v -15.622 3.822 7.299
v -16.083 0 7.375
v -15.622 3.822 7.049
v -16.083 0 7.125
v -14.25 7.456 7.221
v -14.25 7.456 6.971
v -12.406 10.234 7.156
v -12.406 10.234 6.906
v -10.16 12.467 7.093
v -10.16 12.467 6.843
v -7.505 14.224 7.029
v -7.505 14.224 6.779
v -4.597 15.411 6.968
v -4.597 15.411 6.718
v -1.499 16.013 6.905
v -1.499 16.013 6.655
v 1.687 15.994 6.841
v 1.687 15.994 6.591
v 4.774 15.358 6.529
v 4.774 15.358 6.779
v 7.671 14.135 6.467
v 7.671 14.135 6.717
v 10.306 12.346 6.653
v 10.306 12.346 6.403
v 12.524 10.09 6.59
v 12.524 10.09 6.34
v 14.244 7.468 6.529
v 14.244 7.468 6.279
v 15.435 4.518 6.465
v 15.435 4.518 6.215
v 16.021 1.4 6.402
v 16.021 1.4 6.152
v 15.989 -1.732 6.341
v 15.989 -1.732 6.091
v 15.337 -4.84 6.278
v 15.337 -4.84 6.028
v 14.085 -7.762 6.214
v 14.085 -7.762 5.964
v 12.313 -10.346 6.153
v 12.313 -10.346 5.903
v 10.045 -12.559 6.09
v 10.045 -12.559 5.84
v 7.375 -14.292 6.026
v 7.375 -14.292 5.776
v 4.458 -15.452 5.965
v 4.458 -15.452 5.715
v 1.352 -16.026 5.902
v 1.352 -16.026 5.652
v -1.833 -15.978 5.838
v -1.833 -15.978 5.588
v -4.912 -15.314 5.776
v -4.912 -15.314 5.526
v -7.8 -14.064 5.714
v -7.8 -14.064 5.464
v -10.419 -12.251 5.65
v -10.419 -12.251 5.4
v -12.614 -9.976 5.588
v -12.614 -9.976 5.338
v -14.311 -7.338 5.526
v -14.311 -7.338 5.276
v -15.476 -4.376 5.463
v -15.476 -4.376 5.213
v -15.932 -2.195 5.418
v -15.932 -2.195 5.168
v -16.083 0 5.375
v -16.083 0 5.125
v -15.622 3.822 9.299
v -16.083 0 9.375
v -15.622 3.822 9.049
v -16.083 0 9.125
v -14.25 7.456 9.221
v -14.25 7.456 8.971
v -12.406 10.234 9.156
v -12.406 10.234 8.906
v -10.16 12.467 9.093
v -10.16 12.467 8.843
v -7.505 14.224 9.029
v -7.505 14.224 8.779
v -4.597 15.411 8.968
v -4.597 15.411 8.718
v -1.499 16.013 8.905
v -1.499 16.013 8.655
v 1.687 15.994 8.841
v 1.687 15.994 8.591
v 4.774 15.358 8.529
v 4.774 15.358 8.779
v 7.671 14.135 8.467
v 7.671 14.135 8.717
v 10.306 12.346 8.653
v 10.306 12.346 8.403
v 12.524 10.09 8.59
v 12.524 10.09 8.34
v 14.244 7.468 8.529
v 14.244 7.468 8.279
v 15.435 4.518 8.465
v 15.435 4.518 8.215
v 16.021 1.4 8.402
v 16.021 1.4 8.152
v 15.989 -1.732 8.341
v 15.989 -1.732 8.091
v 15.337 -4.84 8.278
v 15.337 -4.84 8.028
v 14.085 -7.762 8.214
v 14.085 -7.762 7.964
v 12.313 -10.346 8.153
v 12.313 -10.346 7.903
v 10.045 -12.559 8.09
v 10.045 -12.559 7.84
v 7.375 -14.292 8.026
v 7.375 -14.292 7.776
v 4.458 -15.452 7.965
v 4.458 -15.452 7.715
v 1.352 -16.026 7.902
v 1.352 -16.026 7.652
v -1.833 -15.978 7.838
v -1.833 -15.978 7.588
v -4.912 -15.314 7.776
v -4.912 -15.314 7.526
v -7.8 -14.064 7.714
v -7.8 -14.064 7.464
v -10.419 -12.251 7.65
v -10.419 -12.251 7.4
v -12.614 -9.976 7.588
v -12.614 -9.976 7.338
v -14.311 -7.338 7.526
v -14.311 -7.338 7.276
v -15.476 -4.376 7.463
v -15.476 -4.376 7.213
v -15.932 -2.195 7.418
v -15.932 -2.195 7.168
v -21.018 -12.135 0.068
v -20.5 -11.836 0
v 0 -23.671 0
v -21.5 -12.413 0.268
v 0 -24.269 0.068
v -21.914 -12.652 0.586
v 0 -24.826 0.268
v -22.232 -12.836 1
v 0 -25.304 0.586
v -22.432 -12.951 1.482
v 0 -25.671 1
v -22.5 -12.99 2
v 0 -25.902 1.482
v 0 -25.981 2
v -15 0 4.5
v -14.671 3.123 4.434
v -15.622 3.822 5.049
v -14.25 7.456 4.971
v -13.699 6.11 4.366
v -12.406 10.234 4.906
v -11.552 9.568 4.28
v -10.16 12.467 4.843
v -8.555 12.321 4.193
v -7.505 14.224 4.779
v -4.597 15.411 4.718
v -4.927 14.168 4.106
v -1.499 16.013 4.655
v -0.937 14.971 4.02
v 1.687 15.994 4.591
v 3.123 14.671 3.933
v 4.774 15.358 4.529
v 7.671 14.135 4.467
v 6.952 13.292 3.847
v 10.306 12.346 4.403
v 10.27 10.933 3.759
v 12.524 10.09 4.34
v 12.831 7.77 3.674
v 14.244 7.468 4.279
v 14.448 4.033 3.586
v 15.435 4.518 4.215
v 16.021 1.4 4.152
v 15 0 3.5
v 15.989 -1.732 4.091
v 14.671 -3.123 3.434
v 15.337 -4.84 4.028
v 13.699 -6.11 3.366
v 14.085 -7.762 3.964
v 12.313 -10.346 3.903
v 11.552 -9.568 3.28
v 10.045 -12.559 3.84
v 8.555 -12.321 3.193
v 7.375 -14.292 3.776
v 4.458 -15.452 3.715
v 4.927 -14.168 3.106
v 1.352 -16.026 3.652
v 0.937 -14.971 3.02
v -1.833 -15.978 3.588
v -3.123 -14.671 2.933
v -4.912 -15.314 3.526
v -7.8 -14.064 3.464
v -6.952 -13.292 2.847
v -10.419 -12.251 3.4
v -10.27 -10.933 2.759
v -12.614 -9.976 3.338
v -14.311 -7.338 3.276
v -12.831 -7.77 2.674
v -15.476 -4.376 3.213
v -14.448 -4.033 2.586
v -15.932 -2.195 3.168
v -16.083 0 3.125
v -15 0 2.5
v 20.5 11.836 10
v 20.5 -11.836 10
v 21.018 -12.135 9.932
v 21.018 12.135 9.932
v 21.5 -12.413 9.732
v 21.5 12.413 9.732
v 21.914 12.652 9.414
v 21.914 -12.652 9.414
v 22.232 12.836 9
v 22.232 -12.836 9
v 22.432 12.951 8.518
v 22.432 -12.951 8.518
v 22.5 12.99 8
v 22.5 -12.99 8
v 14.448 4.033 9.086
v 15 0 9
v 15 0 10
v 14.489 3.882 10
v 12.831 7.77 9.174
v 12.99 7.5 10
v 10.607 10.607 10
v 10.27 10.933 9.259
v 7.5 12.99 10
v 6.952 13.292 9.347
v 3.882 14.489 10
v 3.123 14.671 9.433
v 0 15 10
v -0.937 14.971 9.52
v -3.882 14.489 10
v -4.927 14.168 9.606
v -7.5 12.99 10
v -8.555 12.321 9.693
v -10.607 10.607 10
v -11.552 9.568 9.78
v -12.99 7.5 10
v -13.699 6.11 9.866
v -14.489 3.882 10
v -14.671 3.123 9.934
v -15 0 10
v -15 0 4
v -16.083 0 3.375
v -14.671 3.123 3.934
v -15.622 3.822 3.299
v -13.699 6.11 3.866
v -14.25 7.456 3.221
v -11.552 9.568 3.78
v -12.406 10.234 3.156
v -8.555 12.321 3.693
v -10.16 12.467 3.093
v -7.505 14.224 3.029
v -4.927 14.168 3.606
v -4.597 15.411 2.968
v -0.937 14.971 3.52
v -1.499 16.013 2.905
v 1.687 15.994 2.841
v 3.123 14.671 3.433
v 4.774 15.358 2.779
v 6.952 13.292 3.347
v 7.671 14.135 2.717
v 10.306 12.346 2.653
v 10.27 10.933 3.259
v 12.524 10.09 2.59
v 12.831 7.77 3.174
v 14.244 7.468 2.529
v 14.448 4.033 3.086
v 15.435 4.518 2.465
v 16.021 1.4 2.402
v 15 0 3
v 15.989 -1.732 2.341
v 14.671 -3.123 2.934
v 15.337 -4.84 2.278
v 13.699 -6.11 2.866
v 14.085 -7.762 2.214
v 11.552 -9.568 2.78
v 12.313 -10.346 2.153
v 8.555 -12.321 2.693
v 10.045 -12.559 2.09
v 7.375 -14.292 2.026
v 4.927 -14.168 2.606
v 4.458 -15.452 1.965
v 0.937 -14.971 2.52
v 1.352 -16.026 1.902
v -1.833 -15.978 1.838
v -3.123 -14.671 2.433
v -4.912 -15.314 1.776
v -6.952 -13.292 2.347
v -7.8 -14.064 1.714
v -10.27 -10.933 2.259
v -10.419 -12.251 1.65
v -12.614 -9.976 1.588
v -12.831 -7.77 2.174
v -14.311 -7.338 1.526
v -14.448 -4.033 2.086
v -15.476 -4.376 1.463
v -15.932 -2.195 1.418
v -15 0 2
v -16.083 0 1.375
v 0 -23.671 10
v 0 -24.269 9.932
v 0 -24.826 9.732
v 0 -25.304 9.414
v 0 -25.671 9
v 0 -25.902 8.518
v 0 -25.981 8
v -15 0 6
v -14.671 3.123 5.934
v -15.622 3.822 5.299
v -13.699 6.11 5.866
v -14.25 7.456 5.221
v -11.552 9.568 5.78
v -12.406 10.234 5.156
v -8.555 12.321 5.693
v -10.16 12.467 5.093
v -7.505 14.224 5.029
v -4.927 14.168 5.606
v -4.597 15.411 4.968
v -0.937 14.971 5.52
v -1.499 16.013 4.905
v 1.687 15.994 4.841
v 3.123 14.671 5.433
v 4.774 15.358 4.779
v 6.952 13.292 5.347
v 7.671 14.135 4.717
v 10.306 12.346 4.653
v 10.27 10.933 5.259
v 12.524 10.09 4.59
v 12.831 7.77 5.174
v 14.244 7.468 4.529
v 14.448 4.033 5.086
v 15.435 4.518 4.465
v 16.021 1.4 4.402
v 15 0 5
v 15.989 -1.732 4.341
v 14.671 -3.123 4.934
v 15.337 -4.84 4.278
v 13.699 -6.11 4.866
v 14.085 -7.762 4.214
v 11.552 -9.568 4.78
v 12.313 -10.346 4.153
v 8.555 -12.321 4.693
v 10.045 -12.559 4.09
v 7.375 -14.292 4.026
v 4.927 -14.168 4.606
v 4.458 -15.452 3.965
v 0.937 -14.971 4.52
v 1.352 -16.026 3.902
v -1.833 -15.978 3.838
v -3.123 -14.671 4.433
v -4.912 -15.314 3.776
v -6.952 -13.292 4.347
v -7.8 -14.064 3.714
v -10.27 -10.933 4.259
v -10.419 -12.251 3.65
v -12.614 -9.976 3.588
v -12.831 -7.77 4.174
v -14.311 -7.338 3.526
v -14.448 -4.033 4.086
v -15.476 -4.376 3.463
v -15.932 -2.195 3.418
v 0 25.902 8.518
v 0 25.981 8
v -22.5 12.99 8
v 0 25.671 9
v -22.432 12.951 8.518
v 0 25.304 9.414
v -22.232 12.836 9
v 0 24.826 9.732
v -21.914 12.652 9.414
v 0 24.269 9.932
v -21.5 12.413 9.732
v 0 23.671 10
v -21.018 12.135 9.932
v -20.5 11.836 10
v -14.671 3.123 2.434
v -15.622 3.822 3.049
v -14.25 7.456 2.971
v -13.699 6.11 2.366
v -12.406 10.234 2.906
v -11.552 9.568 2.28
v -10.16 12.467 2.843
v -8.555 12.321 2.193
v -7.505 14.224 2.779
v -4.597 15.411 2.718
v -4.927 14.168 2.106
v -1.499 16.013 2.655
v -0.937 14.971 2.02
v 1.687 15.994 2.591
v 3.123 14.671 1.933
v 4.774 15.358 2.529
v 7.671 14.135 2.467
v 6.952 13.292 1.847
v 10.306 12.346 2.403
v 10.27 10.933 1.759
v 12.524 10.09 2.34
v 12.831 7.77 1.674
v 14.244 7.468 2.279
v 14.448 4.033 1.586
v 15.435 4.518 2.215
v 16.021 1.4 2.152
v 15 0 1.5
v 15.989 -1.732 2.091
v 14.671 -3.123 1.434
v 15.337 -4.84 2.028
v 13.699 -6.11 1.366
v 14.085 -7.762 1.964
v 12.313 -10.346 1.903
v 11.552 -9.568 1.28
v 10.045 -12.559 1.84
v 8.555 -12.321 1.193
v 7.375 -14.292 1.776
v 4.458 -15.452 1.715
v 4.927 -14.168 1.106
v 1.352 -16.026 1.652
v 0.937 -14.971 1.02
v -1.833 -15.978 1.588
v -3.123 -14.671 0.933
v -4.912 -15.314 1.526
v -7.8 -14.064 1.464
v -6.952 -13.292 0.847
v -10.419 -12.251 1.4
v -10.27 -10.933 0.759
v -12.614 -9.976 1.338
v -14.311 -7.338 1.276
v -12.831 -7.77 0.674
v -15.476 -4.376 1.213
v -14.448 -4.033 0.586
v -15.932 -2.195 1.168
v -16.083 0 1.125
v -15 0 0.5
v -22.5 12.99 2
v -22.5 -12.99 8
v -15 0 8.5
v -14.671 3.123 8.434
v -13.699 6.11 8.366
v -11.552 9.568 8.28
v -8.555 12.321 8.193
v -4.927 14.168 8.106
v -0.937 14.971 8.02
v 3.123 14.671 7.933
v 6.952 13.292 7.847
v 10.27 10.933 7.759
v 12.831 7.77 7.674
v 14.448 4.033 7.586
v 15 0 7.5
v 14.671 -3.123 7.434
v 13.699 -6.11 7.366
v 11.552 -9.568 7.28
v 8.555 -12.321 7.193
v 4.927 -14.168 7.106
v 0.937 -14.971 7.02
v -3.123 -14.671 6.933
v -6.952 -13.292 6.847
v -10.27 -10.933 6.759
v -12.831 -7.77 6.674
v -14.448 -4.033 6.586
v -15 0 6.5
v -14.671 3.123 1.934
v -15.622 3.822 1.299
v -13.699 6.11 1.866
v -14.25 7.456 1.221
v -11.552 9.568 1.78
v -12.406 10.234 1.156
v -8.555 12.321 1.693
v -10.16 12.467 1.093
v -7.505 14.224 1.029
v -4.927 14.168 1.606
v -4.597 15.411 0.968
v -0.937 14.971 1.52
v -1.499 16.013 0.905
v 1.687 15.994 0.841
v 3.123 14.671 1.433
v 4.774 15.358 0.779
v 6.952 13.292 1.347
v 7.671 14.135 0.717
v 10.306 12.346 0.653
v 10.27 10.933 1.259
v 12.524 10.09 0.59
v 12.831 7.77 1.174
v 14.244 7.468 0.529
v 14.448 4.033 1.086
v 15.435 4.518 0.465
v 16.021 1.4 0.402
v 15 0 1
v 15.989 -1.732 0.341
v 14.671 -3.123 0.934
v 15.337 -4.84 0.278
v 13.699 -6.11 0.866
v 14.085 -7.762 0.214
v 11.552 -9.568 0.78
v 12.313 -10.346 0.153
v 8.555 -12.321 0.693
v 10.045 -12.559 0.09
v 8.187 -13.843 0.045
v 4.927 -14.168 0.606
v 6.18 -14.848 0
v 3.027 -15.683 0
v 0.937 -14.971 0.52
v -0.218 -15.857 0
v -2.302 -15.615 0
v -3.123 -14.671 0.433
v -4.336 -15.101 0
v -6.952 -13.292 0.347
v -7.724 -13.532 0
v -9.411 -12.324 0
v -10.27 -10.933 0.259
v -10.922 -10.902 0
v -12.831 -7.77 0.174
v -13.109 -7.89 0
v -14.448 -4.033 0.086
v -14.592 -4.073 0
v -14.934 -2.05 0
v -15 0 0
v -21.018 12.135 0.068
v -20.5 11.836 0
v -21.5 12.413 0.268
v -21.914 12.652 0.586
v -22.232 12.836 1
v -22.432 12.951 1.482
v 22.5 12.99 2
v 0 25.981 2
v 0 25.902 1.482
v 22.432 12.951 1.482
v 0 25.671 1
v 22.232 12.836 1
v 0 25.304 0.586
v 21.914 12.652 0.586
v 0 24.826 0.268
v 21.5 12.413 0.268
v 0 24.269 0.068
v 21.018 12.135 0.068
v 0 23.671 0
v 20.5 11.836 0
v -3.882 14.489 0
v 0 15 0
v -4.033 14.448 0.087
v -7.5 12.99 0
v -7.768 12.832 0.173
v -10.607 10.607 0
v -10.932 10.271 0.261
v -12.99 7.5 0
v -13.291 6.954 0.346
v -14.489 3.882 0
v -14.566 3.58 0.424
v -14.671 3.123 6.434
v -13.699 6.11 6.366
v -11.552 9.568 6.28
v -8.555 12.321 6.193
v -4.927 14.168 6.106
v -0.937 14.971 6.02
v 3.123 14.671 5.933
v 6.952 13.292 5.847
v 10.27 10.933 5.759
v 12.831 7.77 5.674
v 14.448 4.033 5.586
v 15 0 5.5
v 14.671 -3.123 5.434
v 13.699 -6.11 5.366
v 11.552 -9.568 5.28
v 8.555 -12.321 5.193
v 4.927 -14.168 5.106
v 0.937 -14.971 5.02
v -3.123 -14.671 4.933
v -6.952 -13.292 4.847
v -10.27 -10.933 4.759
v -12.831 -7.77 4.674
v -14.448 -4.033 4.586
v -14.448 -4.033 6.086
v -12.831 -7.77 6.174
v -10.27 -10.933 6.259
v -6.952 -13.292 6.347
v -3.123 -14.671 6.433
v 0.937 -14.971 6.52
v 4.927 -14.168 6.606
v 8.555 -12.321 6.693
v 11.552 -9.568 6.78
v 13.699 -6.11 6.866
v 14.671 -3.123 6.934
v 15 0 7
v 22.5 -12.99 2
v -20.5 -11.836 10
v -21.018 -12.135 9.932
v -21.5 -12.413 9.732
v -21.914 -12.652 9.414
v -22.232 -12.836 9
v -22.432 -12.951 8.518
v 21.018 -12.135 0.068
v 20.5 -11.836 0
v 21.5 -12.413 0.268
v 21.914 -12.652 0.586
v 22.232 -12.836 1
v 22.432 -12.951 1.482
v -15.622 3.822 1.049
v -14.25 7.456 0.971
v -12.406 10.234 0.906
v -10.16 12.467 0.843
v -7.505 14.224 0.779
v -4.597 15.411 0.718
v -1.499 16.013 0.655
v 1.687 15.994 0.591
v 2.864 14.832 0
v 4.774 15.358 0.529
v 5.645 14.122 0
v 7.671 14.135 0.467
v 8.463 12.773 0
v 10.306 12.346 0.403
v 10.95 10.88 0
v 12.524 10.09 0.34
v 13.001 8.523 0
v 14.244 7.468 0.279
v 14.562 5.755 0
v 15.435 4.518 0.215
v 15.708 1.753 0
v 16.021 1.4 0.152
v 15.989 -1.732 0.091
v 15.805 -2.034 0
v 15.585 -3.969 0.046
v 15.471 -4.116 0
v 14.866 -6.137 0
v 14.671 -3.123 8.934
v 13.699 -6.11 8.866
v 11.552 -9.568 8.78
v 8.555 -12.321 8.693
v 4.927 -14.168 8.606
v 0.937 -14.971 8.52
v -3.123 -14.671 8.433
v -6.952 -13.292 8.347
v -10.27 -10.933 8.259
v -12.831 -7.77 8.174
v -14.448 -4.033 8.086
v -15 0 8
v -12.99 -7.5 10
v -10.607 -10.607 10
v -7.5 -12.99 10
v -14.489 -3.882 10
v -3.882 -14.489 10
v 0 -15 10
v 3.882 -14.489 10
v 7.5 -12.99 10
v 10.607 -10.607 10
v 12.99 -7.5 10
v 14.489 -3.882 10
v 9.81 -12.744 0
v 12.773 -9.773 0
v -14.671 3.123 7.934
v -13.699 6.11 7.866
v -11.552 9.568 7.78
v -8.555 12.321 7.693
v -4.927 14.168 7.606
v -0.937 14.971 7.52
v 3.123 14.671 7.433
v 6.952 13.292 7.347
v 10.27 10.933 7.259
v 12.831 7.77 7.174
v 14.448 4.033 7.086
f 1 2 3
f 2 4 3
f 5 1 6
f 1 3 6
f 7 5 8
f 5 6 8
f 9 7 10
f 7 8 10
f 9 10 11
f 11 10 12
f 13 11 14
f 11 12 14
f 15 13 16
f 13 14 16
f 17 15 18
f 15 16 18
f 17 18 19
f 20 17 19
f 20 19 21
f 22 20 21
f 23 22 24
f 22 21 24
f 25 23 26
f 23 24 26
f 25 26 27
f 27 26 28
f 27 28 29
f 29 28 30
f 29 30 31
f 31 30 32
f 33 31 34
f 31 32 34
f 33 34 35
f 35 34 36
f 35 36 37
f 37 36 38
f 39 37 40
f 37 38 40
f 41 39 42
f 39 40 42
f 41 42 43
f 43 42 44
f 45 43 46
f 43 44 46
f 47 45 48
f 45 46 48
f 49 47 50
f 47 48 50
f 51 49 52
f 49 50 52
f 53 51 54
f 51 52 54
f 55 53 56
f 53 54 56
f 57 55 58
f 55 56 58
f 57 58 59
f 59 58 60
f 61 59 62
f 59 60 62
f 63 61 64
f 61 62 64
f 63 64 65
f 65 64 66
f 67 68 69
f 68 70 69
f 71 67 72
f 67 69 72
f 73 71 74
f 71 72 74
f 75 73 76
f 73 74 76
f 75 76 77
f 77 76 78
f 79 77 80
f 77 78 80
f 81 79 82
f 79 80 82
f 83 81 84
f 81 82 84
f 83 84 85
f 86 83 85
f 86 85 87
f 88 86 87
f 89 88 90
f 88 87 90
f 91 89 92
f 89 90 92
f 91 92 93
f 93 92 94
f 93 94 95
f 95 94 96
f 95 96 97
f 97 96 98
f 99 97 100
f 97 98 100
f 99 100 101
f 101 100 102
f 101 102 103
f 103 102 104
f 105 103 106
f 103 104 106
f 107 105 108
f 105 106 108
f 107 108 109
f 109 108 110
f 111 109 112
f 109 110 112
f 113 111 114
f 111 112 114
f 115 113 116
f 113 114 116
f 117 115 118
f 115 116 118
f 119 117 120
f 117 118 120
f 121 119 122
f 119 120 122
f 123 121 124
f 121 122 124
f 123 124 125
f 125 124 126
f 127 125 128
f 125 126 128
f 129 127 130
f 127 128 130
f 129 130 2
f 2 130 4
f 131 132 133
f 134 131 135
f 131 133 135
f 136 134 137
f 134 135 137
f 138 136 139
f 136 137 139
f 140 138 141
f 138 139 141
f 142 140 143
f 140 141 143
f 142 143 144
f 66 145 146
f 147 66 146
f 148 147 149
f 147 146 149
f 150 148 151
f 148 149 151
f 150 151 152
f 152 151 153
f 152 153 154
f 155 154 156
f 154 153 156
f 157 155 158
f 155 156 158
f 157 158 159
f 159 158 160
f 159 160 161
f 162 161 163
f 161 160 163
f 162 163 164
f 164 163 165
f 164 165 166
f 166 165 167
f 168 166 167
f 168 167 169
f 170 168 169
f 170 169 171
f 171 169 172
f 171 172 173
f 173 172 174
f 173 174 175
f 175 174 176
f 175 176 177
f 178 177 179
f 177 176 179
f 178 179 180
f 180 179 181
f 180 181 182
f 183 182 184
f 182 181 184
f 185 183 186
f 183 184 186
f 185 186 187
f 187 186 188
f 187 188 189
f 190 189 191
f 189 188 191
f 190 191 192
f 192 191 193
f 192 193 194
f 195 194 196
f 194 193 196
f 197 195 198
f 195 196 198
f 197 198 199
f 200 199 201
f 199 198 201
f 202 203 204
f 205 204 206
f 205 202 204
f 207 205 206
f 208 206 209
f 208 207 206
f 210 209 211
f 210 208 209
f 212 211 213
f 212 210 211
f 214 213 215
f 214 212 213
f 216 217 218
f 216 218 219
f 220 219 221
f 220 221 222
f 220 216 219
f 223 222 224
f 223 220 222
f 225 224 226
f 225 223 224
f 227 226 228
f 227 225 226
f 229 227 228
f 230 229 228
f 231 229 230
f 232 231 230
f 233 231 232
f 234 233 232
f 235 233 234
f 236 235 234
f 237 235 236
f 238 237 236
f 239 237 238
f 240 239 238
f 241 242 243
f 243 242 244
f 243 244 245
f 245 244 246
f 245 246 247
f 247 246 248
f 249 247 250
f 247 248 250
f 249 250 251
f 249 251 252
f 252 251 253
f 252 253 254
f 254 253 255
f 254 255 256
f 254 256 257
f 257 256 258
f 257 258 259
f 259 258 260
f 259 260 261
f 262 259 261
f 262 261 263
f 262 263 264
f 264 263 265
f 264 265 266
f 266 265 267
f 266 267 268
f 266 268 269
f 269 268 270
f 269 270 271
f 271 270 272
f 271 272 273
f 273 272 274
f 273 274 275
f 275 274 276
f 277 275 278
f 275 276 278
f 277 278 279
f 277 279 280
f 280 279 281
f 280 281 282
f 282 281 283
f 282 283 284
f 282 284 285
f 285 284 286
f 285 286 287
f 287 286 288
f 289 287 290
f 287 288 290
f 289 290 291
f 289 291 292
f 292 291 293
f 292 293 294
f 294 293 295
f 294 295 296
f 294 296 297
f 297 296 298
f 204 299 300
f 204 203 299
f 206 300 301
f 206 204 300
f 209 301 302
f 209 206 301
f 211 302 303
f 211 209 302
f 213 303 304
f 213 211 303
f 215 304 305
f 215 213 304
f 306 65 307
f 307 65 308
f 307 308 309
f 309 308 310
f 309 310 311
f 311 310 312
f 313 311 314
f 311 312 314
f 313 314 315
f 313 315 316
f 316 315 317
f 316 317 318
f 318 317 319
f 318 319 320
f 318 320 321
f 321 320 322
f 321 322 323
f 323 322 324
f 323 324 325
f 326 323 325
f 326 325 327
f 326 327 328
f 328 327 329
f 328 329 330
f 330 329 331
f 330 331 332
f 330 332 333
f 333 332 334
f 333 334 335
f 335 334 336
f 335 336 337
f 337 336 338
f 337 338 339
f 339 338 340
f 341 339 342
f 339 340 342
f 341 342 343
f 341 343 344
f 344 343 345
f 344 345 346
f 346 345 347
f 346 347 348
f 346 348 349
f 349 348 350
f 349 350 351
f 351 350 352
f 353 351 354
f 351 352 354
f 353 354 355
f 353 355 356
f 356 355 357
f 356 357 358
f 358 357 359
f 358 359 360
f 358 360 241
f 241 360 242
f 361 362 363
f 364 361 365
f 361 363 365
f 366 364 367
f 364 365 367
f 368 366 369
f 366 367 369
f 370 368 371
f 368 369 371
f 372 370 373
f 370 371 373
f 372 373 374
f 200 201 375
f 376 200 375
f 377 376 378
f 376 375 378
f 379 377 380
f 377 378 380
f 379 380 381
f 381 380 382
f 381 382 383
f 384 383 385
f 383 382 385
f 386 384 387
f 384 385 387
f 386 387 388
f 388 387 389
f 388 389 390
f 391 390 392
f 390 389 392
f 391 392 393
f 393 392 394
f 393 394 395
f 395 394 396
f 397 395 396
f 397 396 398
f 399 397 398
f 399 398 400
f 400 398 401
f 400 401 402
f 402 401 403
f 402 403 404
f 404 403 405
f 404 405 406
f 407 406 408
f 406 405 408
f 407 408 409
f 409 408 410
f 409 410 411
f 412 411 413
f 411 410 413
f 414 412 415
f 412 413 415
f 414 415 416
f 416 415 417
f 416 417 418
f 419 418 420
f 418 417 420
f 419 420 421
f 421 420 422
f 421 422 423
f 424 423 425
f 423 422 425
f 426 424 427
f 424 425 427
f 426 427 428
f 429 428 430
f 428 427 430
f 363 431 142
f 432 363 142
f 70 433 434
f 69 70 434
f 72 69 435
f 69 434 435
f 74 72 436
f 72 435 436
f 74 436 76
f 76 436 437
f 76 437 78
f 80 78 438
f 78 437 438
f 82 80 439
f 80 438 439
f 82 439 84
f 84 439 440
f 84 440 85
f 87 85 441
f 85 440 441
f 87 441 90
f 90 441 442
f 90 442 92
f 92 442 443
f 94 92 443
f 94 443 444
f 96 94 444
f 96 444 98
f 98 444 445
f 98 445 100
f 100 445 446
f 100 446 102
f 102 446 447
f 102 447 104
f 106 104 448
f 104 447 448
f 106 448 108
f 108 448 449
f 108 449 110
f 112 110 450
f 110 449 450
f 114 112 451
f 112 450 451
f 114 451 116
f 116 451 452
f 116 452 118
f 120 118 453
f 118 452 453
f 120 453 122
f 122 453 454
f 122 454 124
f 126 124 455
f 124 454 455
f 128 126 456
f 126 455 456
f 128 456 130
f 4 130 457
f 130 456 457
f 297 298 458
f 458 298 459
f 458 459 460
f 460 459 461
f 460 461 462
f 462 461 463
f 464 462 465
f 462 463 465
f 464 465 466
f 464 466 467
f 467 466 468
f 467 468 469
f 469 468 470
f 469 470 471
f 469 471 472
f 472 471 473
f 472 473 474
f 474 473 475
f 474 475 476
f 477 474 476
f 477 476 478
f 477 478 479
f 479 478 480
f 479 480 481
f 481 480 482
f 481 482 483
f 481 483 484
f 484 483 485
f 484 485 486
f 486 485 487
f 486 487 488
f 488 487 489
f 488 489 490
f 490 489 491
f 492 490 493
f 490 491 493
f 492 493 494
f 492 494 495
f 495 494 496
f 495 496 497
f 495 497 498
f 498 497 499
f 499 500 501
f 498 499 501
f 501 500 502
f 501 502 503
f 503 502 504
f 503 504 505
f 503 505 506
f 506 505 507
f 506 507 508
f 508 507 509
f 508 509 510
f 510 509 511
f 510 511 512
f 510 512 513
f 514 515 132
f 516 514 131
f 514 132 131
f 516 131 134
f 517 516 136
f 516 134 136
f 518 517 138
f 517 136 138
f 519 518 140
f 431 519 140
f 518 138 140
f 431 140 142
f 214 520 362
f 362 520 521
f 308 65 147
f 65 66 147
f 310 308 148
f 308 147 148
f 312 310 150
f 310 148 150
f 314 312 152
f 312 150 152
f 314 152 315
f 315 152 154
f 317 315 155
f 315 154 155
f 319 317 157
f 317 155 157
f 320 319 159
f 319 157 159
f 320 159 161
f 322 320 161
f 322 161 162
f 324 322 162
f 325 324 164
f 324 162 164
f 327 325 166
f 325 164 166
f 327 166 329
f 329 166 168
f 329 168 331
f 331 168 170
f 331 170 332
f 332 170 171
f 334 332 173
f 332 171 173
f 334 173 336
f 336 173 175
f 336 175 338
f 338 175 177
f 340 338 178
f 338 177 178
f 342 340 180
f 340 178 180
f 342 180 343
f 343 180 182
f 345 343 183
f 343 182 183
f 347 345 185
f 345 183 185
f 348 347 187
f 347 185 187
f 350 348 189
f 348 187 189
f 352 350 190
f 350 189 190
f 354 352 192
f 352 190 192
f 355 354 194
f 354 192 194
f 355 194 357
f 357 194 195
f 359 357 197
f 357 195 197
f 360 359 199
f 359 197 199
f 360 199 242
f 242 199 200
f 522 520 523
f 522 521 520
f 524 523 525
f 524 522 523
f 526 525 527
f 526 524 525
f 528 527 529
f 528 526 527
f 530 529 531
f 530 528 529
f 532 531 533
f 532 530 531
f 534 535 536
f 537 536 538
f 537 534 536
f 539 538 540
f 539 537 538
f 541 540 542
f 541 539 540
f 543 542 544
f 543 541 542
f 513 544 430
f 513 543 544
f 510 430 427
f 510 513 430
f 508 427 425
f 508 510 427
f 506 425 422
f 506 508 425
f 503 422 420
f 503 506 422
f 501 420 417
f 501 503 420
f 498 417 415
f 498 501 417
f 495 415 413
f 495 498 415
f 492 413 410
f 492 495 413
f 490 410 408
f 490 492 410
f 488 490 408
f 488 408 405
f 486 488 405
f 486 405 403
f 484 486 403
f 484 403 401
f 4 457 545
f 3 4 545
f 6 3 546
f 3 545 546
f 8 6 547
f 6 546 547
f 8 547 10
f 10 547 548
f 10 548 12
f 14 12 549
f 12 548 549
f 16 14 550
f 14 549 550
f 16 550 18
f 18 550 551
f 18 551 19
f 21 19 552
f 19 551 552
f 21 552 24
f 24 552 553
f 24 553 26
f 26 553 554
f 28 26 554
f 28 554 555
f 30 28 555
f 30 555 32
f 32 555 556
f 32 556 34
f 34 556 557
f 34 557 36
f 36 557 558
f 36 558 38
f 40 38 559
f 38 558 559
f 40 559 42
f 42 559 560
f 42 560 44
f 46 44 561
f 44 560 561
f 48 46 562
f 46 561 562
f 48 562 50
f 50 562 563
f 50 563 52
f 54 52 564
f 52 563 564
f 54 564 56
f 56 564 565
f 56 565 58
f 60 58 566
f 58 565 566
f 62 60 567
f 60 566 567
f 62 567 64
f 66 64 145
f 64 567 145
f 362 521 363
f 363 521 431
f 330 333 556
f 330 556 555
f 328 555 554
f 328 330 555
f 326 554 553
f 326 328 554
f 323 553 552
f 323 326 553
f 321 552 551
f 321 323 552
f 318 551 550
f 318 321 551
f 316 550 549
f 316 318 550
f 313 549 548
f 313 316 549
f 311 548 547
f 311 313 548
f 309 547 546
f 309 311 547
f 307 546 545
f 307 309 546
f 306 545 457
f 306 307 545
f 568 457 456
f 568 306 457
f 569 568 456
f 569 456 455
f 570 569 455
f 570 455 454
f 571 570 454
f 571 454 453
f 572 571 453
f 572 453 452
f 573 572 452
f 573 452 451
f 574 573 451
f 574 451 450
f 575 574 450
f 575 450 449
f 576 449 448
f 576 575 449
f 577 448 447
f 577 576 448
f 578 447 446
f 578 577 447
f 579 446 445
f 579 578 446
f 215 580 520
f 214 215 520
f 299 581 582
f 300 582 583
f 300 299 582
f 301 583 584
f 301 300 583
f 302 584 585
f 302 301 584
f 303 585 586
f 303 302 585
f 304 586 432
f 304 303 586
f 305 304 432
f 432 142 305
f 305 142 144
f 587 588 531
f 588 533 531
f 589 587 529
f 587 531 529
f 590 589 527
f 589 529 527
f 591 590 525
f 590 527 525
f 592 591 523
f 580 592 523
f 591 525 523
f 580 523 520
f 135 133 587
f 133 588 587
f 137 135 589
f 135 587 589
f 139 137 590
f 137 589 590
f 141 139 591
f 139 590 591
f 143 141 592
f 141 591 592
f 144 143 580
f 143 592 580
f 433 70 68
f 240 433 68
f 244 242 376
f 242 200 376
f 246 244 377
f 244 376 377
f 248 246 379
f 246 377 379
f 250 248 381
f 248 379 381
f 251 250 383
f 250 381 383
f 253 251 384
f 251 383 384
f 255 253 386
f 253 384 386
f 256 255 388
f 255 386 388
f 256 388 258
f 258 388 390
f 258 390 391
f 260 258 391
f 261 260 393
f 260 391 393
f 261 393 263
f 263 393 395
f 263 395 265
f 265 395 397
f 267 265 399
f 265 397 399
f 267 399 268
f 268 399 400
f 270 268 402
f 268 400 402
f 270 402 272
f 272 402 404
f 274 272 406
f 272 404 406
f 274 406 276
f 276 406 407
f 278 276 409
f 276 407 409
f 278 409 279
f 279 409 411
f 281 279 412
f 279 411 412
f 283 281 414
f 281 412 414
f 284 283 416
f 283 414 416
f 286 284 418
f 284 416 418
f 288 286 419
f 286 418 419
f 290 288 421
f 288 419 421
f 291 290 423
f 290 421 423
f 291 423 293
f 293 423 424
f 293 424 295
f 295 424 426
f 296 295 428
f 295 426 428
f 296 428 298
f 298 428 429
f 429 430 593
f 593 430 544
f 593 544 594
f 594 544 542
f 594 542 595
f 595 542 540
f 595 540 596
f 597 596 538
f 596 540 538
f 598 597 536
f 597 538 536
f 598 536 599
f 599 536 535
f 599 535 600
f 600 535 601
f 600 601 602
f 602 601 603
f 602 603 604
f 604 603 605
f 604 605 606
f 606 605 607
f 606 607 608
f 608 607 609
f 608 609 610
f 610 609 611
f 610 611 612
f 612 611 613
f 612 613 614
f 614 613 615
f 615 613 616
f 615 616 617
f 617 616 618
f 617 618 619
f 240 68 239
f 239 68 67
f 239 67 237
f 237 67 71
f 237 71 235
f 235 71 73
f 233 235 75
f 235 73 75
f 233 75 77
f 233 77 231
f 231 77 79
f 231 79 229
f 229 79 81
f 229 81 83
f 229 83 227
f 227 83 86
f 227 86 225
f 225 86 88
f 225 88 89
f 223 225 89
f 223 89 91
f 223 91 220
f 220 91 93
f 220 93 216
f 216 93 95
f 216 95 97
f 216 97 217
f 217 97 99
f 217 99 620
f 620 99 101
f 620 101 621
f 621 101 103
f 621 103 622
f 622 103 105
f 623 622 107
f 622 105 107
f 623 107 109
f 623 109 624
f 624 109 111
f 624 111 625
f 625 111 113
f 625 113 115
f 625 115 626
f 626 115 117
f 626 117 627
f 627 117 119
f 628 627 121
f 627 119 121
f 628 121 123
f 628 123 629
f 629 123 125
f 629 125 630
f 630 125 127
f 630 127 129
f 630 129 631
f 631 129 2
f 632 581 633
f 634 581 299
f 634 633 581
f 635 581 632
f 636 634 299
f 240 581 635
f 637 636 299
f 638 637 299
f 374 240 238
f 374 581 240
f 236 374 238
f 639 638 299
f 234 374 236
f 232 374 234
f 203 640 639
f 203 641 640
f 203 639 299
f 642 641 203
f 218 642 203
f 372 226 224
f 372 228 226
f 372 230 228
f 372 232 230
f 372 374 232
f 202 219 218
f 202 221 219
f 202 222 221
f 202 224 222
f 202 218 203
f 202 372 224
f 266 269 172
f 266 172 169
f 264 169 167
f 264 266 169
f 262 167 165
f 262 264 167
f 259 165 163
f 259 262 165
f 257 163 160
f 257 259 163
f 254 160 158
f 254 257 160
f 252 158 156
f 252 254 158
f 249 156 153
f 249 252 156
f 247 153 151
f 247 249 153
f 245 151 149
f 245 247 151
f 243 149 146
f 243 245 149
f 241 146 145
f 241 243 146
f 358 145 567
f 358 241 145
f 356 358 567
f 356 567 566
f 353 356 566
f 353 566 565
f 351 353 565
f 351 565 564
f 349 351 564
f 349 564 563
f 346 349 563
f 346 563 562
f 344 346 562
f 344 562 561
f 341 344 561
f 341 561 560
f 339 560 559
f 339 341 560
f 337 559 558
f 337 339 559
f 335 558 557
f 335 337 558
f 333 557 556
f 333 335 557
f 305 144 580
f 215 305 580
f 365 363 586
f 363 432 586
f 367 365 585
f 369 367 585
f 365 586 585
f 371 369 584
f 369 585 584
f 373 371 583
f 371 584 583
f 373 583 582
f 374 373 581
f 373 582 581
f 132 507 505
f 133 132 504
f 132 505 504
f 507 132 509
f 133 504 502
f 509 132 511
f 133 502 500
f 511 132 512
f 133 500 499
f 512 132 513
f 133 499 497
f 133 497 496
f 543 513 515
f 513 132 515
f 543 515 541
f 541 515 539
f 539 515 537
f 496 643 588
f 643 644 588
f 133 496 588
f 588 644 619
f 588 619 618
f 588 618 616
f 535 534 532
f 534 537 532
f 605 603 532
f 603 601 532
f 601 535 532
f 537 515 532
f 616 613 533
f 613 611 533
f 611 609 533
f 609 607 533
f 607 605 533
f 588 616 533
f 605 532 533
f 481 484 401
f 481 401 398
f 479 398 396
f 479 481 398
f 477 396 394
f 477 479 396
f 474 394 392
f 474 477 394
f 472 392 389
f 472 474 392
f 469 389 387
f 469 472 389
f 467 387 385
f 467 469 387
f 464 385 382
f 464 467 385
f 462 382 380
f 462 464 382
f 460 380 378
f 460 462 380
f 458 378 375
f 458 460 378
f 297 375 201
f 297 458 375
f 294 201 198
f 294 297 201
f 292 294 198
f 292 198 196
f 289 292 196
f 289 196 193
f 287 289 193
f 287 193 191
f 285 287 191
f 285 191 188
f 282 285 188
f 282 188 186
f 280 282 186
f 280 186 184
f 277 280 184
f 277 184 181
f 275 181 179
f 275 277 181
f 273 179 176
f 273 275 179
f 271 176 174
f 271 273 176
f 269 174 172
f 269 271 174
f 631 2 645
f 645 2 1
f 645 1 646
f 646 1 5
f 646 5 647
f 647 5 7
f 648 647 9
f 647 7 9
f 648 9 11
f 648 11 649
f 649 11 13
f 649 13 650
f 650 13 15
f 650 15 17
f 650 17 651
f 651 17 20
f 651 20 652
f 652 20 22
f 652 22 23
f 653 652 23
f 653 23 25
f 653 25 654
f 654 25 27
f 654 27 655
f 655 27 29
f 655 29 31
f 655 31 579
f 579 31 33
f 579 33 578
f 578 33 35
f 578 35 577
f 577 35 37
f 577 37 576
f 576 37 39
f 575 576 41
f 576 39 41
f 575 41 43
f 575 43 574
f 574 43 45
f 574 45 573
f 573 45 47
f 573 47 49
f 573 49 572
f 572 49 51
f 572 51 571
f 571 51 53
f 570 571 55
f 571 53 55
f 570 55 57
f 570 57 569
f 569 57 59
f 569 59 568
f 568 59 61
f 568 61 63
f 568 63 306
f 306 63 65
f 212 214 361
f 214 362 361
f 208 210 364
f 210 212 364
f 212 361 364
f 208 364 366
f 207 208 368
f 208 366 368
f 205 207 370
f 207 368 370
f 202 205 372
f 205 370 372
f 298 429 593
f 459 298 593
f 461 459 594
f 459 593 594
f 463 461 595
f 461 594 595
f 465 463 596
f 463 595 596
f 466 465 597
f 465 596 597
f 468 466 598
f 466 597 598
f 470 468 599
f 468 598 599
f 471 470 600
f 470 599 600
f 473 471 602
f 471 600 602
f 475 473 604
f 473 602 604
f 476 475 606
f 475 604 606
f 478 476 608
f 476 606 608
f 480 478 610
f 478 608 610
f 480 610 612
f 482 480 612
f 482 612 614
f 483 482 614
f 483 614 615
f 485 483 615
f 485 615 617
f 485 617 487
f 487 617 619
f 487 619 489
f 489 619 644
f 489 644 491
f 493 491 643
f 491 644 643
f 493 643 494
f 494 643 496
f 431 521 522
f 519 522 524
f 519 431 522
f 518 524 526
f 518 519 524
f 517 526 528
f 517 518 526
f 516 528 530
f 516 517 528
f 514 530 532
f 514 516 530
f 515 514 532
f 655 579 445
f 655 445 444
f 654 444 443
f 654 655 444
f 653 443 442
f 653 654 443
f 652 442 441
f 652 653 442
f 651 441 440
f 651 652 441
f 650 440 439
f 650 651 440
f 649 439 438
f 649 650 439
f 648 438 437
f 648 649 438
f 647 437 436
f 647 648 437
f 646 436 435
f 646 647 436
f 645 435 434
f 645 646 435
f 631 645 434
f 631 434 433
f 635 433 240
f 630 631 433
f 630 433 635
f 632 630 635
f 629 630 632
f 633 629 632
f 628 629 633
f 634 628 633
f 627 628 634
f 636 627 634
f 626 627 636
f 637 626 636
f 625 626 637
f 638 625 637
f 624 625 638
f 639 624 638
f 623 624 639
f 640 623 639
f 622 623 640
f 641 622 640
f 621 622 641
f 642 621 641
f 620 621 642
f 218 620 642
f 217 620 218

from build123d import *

# Parameters (mm, degrees)
IZIM1_R                     = 15
Y_KSEKLIK_EKSTR_ZYON1_DEPTH = 10
DI_2_PITCH                  = 2
RADYUS1_R                   = 2
RADYUS3_R                   = 2


with BuildPart() as part:
    # Çizim1 → Yükseklik-Ekstrüzyon1 (new body)
    with BuildSketch(Plane.XY):
        Polygon((0, 25.980762114), (-22.5, 12.990381057), (-22.5, -12.990381057), (0, -25.980762114), (22.5, -12.990381057), (22.5, 12.990381057), align=None)
        Circle(IZIM1_R, mode=Mode.SUBTRACT)
    extrude(amount=Y_KSEKLIK_EKSTR_ZYON1_DEPTH)

    # Diş2: the profile of Diş Profili2 profile screwed along a right-hand helix of 5 turns, 10 arcs to a turn; built about Z, then put on its axis
    di_2_z = Axis((0, 0, 0), (0, 0, 1))
    di_2_corners = [(14.9997, 0, -0.000173205), (16.08253175, 0, 0.624999997), (16.08253175, 0, 0.874999997), (14.9997, 0, 1.5001732)]
    with BuildLine(mode=Mode.PRIVATE) as di_2_profile:
        Line(di_2_corners[0], di_2_corners[1])
        Line(di_2_corners[1], di_2_corners[2])
        Line(di_2_corners[2], di_2_corners[3])
        Line(di_2_corners[3], di_2_corners[0])
    di_2_cap = Face(di_2_profile.wire())
    di_2_turn_angles = [0, 18, 36, 54, 72, 90, 108, 126, 144, 162, 180, 198, 216, 234, 252, 270, 288, 306, 324, 342, 360]
    di_2_turn_weights = [1, 0.9510565162951535, 1, 0.9510565162951535, 1, 0.9510565162951535, 1, 0.9510565162951535, 1, 0.9510565162951535, 1, 0.9510565162951535, 1, 0.9510565162951535, 1, 0.9510565162951535, 1, 0.9510565162951535, 1, 0.9510565162951535, 1]
    di_2_turn_rails = [Edge.make_bspline([Vector(p[0], p[1], 0).rotate(di_2_z, di_2_turn_angles[k]) / di_2_turn_weights[k] + Vector(0, 0, p[2] + DI_2_PITCH * di_2_turn_angles[k] / 360) for k in range(21)], [0, 0, 0, 1, 1, 2, 2, 3, 3, 4, 4, 5, 5, 6, 6, 7, 7, 8, 8, 9, 9, 10, 10, 10], 2, di_2_turn_weights) for p in di_2_corners]
    di_2_turn_sides = [Face.make_surface_from_curves(di_2_turn_rails[p[0]], di_2_turn_rails[p[1]]) for p in [(0, 1), (1, 2), (2, 3), (3, 0)]]
    di_2 = Plane(origin=(0, 0, 10), x_dir=(-1, 0, 0), z_dir=(0, 0, -1)) * Solid(Shell([*[p.moved(Location((0, 0, DI_2_PITCH * i))) for i in range(5) for p in di_2_turn_sides], di_2_cap, di_2_cap.rotate(di_2_z, 1800).moved(Location((0, 0, DI_2_PITCH * 1800 / 360)))]))
    add(di_2, mode=Mode.SUBTRACT)

    # Radyus1
    radyus1_edges = [part.edges().sort_by_distance(p)[0] for p in [
        (-22.5, 0, 10),
        (-11.25, -19.485571585, 10),
        (11.25, -19.485571585, 10),
        (22.5, 0, 10),
        (11.25, 19.485571585, 10),
        (-11.25, 19.485571585, 10),
    ]]
    fillet(radyus1_edges, radius=RADYUS1_R)

    # Radyus3
    radyus3_edges = [part.edges().sort_by_distance(p)[0] for p in [
        (22.5, 0, 0),
        (11.25, -19.485571585, 0),
        (-11.25, -19.485571585, 0),
        (-22.5, 0, 0),
        (-11.25, 19.485571585, 0),
        (11.25, 19.485571585, 0),
    ]]
    fillet(radyus3_edges, radius=RADYUS3_R)


solid = part.part
